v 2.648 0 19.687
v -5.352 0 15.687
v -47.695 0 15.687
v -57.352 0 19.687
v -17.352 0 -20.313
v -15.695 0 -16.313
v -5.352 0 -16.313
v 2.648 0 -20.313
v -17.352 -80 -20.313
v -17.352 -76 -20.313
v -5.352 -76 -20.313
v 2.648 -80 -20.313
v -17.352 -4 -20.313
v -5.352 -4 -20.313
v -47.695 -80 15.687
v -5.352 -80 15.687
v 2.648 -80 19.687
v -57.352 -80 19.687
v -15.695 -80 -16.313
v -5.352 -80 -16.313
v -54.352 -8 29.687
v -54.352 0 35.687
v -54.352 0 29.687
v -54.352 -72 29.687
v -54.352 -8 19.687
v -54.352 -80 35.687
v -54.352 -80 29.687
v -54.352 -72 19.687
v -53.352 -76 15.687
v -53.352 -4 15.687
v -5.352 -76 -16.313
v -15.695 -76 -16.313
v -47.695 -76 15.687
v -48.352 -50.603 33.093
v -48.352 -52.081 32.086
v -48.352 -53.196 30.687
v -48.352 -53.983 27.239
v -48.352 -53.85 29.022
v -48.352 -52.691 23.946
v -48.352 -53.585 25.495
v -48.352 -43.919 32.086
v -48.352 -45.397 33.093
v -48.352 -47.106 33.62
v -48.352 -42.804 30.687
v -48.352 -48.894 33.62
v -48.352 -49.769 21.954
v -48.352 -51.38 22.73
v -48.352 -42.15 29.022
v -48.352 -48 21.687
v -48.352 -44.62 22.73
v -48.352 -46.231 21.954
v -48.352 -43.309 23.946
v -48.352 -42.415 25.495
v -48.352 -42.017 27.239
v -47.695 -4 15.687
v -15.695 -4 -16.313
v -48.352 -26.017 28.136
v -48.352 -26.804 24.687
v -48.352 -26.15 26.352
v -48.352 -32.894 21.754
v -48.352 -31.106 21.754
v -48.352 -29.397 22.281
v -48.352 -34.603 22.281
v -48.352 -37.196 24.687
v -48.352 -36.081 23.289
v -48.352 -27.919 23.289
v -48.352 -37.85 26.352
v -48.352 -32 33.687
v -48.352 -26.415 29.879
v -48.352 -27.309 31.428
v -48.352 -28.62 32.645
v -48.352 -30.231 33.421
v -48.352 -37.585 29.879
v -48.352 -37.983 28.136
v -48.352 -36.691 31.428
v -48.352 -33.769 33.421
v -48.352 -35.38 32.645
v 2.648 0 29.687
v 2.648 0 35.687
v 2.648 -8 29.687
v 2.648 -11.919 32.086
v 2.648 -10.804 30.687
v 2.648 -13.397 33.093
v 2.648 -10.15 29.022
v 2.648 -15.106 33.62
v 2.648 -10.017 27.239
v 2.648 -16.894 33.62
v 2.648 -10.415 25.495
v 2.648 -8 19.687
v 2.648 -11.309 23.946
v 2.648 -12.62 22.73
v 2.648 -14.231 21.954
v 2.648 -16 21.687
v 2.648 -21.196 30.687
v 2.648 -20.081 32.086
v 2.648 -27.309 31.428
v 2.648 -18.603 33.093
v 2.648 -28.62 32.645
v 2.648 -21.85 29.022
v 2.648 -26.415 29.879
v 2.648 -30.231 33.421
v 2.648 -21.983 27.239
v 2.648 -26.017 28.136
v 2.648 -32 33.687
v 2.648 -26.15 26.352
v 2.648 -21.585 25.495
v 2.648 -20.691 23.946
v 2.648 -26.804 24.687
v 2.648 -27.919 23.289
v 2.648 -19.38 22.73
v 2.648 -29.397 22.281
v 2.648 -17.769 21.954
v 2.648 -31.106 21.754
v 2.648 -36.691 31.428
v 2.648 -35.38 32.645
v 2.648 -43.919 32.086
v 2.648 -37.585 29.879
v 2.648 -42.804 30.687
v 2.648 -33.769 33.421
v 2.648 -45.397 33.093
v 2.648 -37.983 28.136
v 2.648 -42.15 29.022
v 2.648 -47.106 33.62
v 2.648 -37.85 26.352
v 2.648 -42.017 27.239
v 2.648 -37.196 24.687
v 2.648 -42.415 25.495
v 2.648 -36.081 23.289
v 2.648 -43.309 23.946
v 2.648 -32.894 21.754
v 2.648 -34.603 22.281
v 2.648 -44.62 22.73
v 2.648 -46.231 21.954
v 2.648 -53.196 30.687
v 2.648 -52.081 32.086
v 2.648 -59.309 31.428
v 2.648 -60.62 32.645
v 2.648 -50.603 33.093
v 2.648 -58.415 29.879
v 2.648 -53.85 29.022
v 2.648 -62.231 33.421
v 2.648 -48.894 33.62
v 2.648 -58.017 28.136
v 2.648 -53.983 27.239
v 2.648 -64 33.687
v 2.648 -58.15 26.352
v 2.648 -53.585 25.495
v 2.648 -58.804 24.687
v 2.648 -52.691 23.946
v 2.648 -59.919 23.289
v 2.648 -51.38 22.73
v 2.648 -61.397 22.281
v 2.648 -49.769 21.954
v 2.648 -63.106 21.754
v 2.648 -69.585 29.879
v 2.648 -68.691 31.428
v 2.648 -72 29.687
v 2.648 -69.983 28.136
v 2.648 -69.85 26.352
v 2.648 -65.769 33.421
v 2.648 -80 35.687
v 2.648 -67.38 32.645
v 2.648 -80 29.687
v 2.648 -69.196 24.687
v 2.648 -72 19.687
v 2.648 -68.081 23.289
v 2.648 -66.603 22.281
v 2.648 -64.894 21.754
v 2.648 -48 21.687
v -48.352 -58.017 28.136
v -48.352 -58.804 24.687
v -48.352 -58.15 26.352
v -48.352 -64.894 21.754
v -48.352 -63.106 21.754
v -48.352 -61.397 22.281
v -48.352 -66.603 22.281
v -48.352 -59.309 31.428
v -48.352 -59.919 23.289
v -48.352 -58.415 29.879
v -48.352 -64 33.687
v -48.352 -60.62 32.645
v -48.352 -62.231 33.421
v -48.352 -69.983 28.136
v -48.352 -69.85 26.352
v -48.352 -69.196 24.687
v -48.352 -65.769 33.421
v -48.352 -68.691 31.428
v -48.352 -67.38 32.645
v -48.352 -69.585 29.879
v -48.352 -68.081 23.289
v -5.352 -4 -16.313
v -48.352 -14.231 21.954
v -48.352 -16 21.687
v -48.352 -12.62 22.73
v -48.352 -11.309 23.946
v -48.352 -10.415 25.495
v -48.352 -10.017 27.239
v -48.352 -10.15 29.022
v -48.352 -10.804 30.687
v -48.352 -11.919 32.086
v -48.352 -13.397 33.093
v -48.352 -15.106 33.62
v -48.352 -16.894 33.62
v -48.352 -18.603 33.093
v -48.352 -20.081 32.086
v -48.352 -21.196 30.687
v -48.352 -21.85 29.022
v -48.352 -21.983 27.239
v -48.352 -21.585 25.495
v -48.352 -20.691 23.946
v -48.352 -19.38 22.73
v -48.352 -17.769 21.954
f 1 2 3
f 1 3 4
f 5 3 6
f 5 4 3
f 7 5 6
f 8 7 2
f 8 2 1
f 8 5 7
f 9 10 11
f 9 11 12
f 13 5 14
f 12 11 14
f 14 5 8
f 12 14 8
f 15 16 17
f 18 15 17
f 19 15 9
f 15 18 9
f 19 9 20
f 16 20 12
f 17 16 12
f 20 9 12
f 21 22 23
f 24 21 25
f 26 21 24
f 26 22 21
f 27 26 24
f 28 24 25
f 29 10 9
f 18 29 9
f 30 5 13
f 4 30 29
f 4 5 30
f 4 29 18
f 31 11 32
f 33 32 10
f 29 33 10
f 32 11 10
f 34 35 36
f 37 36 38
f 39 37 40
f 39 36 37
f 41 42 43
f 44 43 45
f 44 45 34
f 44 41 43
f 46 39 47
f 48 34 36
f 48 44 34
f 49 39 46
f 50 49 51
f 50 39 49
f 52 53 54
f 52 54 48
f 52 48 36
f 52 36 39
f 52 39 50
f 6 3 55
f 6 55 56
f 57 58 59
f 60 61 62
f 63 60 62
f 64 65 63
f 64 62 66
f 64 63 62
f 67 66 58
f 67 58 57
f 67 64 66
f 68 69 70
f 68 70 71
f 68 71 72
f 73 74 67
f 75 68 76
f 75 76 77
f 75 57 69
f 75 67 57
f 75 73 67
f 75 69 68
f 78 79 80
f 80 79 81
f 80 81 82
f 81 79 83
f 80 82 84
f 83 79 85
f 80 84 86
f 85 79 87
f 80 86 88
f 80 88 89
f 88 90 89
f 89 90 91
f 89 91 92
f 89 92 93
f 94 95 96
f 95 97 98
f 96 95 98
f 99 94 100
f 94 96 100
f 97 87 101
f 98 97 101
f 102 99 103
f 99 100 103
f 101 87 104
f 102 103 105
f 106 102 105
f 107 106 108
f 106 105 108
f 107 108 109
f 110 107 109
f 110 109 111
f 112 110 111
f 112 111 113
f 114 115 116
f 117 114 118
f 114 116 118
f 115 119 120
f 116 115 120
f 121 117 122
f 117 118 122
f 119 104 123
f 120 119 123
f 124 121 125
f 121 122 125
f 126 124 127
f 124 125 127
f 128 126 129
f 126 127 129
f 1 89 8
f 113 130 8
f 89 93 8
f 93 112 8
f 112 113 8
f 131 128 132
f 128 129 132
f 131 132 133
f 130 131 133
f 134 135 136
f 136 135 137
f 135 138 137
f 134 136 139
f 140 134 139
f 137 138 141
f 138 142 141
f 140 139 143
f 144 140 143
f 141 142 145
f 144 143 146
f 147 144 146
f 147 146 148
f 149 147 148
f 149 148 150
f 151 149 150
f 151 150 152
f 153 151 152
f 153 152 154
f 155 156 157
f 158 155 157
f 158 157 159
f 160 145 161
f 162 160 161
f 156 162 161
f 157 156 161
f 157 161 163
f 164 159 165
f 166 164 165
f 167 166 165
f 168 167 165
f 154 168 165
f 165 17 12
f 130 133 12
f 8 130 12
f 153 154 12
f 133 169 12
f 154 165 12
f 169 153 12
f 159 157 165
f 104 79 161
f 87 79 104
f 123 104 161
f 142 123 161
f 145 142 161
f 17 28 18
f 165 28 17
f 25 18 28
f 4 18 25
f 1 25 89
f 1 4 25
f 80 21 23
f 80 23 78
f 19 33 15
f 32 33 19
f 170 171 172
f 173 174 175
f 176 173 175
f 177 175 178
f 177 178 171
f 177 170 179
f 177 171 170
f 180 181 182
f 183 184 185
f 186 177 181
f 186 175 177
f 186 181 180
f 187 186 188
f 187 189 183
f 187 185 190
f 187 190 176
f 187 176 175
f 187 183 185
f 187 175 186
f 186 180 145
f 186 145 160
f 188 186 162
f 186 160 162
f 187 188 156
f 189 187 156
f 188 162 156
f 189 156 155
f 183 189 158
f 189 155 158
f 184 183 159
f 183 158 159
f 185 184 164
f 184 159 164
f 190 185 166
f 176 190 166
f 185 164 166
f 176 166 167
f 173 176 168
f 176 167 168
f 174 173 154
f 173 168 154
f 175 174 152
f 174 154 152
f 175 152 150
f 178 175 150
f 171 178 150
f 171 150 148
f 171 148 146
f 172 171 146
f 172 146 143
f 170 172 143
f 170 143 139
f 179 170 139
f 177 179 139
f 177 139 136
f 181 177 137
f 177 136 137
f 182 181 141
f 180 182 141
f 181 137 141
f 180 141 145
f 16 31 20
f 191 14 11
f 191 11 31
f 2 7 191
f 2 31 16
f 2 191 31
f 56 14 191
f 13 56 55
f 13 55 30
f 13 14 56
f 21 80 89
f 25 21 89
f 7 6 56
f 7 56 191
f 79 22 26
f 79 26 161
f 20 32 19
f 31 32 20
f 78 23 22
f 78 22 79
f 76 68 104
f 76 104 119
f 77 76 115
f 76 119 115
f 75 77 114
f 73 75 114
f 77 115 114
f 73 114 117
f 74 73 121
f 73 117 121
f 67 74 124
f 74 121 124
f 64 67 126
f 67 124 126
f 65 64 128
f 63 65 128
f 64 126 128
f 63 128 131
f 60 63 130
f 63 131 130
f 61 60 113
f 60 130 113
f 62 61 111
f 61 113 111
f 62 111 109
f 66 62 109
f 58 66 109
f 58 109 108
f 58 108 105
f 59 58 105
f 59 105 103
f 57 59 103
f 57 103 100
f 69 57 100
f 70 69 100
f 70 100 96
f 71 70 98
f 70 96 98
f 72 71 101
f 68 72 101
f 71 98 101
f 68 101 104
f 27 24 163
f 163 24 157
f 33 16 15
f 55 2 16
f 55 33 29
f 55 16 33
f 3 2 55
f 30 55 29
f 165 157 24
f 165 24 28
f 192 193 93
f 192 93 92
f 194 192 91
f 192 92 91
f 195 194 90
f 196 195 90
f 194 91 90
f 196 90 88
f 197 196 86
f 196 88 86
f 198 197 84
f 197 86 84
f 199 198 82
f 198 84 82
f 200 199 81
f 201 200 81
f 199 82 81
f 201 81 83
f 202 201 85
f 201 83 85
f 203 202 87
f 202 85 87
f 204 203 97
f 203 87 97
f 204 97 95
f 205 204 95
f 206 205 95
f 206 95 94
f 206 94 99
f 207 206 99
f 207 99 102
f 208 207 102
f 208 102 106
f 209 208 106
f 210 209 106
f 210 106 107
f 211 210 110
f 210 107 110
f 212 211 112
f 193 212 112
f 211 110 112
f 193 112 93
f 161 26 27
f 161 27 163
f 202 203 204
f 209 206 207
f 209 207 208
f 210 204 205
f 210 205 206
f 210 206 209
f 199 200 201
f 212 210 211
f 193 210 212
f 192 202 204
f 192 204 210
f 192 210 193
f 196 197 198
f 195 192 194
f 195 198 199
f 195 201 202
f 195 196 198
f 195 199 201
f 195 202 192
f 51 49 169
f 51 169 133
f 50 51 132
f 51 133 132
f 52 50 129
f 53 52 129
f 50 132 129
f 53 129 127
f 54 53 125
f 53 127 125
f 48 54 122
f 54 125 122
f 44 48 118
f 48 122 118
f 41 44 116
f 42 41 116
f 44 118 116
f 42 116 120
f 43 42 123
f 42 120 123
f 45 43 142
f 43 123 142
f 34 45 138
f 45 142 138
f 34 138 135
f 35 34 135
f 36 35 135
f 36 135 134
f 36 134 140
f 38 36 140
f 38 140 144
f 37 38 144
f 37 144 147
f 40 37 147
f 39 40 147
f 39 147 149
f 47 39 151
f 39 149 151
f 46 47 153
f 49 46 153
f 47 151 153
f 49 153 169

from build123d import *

# Parameters (mm, degrees)
SKETCH1_W           = 20
SKETCH1_H           = 40
BOSS_EXTRUDE1_DEPTH = 80
SKETCH8_W           = 16
SKETCH8_H           = 64
BOSS_EXTRUDE2_DEPTH = 57
SKETCH10_R          = 6
CUT_EXTRUDE1_DEPTH  = 51
CUT_EXTRUDE2_DEPTH  = 105.703357948
SKETCH12_W          = 57
SKETCH12_H          = 6
BOSS_EXTRUDE3_DEPTH = 8
SKETCH14_W          = 57
SKETCH14_H          = 6
BOSS_EXTRUDE4_DEPTH = 8
SKETCH17_W          = 48
SKETCH17_H          = 72
CUT_EXTRUDE4_DEPTH  = 36


with BuildPart() as part:
    # Sketch1 → Boss-Extrude1 (new body)
    with BuildSketch(Plane(origin=(0, 0, 0), x_dir=(1, 0, 0), z_dir=(0, 1, 0))):
        Polygon((-17.351649908, 20.312727502), (-57.351649908, -19.687272498), (-17.351649908, -19.687272498), align=None)
        with Locations((-7.351649908, 0.312727502)):
            Rectangle(SKETCH1_W, SKETCH1_H)
    extrude(amount=-BOSS_EXTRUDE1_DEPTH)

    # Sketch8 → Boss-Extrude2 (add)
    with BuildSketch(Plane(origin=(2.648350092, 0, 0), x_dir=(0, 0, -1), z_dir=(1, 0, 0))):
        with Locations((-27.687272498, -40)):
            Rectangle(SKETCH8_W, SKETCH8_H)
    extrude(amount=-BOSS_EXTRUDE2_DEPTH)

    # Sketch10 → Cut-Extrude1 (cut)
    with BuildSketch(Plane(origin=(2.648350092, 0, 0), x_dir=(0, 0, -1), z_dir=(1, 0, 0))):
        with Locations((-27.687272498, -16)):
            Circle(SKETCH10_R)
        with Locations(Location((-27.687272498, -32, 0), (0, 0, 180))):
            Circle(SKETCH10_R)
        with Locations(Location((-27.687272498, -64, 0), (0, 0, 180))):
            Circle(SKETCH10_R)
        with Locations((-27.687272498, -48)):
            Circle(SKETCH10_R)
    extrude(amount=-CUT_EXTRUDE1_DEPTH, mode=Mode.SUBTRACT)

    # Sketch11 → Cut-Extrude2 (cut, through all)
    with BuildSketch(Plane(origin=(0, 0, 0), x_dir=(1, 0, 0), z_dir=(0, 1, 0))):
        Polygon((-47.694795658, -15.687272498), (-15.694795658, 16.312727502), (-5.351649908, 16.312727502), (-5.351649908, -15.687272498), align=None)
    extrude(amount=-CUT_EXTRUDE2_DEPTH, mode=Mode.SUBTRACT)

    # Sketch12 → Boss-Extrude3 (add)
    with BuildSketch(Plane.XZ.offset(72)):
        with Locations((-25.851649908, 32.687272498)):
            Rectangle(SKETCH12_W, SKETCH12_H)
    extrude(amount=BOSS_EXTRUDE3_DEPTH)

    # Sketch14 → Boss-Extrude4 (add)
    with BuildSketch(Plane(origin=(0, -8, 0), x_dir=(1, 0, 0), z_dir=(0, 1, 0))):
        with Locations((-25.851649908, -32.687272498)):
            Rectangle(SKETCH14_W, SKETCH14_H)
    extrude(amount=BOSS_EXTRUDE4_DEPTH)

    # Sketch17 → Cut-Extrude4 (cut)
    with BuildSketch(Plane(origin=(0, 0, -20.312727502), x_dir=(-1, 0, 0), z_dir=(0, 0, -1))):
        with Locations((29.351649908, -40)):
            Rectangle(SKETCH17_W, SKETCH17_H)
    extrude(amount=-CUT_EXTRUDE4_DEPTH, mode=Mode.SUBTRACT)


solid = part.part
